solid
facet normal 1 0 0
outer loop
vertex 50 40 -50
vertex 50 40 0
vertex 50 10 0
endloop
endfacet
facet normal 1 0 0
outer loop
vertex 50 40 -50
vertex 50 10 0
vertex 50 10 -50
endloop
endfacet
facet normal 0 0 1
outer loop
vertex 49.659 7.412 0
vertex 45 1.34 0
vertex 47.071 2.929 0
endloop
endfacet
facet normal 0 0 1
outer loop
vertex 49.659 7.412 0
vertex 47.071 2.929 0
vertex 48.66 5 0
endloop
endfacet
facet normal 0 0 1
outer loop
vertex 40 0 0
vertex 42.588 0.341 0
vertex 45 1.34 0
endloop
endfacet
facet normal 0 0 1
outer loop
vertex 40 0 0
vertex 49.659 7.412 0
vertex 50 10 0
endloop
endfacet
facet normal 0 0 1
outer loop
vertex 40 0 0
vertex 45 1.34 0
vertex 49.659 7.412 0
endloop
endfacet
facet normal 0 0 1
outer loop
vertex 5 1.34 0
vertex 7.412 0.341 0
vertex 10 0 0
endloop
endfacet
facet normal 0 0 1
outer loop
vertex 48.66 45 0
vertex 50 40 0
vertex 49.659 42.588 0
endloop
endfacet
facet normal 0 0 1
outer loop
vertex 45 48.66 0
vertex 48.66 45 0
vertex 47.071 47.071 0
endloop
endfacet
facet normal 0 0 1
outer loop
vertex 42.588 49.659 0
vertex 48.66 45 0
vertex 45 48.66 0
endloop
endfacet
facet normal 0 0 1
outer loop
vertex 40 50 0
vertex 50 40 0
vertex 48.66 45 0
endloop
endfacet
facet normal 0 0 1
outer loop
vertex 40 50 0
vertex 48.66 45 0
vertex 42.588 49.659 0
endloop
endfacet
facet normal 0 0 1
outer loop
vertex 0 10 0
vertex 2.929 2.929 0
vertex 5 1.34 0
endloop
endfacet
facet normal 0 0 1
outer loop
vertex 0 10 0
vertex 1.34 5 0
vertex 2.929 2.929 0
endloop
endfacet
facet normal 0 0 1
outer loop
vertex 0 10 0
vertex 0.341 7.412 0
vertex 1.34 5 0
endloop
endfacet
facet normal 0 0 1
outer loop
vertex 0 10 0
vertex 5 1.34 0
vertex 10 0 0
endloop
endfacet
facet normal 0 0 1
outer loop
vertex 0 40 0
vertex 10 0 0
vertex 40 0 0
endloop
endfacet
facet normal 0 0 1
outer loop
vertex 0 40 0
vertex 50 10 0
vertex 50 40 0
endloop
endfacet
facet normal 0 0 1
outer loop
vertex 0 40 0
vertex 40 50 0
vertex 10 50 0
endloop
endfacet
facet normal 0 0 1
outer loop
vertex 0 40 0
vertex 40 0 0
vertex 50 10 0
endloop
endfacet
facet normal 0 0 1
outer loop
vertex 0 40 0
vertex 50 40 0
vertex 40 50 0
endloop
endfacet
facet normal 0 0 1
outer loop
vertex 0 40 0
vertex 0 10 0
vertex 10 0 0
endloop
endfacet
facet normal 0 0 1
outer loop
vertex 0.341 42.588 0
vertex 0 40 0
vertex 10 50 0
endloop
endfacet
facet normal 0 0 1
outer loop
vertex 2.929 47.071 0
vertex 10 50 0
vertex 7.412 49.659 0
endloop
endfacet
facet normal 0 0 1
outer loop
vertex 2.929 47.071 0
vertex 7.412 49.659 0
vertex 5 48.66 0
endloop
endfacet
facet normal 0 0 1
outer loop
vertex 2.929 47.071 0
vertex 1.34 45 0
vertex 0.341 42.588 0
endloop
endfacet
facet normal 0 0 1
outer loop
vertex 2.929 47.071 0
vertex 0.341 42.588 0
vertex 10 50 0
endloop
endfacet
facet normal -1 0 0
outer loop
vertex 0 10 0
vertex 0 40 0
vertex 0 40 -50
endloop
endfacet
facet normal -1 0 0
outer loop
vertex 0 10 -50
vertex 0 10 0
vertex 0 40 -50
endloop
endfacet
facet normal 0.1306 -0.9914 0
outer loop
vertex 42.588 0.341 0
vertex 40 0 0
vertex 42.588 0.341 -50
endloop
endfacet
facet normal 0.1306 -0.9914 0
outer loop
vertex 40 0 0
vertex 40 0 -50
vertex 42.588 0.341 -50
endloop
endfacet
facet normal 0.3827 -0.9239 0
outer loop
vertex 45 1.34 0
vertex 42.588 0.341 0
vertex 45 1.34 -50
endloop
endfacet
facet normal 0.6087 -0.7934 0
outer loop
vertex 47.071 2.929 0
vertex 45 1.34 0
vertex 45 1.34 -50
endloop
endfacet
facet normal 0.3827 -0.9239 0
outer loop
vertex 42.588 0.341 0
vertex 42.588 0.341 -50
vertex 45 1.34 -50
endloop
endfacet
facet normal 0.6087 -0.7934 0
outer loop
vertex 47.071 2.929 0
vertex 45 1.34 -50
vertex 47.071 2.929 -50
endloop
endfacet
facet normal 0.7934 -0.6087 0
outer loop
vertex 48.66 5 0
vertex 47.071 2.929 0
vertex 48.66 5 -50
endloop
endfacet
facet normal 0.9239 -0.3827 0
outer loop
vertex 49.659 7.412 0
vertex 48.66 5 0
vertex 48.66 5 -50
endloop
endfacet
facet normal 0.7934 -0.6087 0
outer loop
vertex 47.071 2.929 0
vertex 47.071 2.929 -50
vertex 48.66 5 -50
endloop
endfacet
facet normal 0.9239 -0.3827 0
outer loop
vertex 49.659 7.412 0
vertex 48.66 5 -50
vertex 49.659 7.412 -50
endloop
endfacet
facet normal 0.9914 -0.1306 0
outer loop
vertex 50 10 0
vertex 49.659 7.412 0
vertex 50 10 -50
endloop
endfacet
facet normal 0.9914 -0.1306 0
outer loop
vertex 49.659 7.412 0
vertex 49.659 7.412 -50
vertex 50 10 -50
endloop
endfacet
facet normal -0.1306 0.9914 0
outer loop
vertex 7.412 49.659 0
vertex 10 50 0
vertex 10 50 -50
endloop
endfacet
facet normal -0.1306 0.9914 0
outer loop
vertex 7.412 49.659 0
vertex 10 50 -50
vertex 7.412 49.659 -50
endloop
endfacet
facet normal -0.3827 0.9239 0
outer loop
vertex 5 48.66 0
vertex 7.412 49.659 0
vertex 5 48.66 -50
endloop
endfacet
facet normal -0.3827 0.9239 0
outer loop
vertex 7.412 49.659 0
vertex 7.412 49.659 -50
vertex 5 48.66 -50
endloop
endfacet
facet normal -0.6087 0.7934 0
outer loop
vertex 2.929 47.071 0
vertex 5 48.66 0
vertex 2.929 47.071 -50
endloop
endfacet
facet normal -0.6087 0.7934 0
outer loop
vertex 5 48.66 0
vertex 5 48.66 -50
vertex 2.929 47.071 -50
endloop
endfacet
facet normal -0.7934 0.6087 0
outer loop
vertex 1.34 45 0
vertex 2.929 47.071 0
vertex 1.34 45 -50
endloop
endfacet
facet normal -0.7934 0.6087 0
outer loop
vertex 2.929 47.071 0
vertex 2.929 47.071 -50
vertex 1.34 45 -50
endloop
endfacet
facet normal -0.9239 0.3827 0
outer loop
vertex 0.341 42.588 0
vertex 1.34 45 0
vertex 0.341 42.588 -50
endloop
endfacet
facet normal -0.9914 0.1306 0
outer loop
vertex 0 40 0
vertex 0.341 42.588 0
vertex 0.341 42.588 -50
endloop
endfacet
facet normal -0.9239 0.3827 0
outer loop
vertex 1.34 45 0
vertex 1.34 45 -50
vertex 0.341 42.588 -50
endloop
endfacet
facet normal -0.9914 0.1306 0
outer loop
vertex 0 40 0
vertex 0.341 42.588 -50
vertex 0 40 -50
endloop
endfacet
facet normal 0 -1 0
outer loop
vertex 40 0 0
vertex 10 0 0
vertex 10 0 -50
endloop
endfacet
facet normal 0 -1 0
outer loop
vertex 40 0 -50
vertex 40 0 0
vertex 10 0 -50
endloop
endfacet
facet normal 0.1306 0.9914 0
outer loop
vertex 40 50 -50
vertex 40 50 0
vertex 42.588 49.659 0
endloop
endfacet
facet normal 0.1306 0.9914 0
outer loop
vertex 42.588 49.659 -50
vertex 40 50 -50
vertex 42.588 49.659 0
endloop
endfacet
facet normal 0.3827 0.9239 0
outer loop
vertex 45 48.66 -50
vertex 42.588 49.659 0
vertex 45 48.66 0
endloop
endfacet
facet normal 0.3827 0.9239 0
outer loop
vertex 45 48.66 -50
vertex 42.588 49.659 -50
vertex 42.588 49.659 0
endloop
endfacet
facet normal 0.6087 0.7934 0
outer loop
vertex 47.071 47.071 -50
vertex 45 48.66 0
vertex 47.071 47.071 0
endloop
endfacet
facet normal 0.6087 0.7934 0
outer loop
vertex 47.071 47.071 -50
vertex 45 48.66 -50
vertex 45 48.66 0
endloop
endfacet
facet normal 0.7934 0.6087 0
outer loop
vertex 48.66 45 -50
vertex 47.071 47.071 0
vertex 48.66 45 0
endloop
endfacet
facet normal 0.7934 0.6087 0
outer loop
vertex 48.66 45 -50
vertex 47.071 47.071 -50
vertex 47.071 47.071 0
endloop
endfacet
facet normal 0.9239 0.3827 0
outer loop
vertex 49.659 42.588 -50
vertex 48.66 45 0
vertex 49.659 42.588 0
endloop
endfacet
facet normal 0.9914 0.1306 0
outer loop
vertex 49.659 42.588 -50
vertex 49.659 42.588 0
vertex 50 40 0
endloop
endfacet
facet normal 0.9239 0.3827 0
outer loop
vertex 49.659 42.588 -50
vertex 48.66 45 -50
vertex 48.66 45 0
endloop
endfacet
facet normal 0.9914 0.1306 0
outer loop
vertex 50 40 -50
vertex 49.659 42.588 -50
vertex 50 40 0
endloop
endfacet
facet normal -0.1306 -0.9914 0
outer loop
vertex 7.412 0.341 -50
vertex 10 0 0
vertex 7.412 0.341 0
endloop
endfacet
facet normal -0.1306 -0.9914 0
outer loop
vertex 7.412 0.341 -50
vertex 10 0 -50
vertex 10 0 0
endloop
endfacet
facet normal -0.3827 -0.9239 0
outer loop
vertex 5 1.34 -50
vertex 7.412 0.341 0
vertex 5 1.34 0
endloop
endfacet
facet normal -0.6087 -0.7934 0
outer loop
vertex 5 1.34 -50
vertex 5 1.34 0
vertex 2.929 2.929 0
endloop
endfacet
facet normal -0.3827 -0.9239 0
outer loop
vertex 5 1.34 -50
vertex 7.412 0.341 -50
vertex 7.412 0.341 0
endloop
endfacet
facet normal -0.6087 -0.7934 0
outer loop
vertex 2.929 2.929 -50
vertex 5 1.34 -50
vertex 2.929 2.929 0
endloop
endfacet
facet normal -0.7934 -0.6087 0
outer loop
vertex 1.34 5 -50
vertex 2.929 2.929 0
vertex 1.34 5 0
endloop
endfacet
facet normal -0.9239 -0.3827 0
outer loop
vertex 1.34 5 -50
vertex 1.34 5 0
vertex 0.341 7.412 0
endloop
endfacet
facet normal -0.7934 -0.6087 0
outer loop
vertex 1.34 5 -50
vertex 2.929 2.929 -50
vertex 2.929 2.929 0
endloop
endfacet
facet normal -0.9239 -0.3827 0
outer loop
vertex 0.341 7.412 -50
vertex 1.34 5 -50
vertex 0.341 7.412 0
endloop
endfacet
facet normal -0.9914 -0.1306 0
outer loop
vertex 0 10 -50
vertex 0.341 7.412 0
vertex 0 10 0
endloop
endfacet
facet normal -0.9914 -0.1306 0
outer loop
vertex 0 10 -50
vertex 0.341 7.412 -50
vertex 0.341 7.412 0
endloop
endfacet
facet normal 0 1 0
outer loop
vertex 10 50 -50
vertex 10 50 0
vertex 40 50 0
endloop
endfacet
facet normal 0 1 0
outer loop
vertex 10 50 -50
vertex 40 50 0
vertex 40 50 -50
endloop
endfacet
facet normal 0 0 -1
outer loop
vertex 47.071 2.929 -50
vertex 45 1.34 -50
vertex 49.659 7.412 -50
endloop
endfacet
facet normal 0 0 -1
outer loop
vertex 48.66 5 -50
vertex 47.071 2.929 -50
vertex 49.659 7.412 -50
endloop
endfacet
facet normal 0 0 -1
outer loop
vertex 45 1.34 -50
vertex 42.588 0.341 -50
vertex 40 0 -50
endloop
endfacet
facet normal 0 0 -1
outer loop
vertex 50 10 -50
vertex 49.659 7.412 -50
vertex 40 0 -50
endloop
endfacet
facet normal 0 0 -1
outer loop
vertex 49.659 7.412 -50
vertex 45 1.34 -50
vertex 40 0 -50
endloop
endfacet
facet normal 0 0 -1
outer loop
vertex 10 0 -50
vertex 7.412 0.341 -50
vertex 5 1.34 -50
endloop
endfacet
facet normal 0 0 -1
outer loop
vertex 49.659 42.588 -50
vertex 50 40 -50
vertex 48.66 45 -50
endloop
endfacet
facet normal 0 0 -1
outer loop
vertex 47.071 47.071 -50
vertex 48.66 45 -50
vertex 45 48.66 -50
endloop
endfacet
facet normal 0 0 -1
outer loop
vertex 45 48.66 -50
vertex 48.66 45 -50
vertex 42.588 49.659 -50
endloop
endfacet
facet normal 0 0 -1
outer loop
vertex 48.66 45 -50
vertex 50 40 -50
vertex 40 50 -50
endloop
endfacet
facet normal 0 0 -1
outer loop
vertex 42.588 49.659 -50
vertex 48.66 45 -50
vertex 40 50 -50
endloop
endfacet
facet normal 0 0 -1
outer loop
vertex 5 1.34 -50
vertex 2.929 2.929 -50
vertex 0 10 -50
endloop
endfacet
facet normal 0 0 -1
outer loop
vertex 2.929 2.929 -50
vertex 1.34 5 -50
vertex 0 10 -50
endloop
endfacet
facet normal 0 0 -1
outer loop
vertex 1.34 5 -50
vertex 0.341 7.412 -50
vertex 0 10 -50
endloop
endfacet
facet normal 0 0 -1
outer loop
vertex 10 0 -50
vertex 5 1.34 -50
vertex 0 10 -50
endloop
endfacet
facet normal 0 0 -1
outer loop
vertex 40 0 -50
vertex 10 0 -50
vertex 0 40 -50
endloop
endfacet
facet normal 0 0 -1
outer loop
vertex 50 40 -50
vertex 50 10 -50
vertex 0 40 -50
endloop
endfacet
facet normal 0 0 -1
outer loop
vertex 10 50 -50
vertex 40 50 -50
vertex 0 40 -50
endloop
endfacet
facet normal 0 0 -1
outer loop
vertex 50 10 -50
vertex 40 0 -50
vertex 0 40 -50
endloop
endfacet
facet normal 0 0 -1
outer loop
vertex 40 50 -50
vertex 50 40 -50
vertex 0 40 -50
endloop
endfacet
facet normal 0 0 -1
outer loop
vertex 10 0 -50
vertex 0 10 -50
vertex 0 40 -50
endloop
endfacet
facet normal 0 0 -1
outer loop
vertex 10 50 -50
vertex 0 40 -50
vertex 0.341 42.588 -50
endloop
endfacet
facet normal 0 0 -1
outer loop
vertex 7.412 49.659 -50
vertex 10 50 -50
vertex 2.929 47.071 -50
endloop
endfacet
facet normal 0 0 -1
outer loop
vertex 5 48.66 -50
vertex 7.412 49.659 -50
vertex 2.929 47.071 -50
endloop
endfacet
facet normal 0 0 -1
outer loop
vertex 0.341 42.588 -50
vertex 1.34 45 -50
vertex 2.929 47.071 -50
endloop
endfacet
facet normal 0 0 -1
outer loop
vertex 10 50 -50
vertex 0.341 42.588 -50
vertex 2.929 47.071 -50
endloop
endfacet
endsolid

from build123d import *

# Parameters (mm, degrees)
CROQUIS1_W              = 50
CROQUIS1_H              = 50
SALIENTE_EXTRUIR1_DEPTH = 50
REDONDEO1_R             = 10


with BuildPart() as part:
    # Croquis1 → Saliente-Extruir1 (new body)
    with BuildSketch(Plane(origin=(0, 0, 0), x_dir=(0, 0, -1), z_dir=(1, 0, 0))):
        with Locations((25, 25)):
            Rectangle(CROQUIS1_W, CROQUIS1_H)
    extrude(amount=SALIENTE_EXTRUIR1_DEPTH)

    # Redondeo1
    redondeo1_edges = [part.edges().sort_by_distance(p)[0] for p in [
        (50, 50, -25),
        (0, 50, -25),
        (0, 0, -25),
        (50, 0, -25),
    ]]
    fillet(redondeo1_edges, radius=REDONDEO1_R)


solid = part.part
